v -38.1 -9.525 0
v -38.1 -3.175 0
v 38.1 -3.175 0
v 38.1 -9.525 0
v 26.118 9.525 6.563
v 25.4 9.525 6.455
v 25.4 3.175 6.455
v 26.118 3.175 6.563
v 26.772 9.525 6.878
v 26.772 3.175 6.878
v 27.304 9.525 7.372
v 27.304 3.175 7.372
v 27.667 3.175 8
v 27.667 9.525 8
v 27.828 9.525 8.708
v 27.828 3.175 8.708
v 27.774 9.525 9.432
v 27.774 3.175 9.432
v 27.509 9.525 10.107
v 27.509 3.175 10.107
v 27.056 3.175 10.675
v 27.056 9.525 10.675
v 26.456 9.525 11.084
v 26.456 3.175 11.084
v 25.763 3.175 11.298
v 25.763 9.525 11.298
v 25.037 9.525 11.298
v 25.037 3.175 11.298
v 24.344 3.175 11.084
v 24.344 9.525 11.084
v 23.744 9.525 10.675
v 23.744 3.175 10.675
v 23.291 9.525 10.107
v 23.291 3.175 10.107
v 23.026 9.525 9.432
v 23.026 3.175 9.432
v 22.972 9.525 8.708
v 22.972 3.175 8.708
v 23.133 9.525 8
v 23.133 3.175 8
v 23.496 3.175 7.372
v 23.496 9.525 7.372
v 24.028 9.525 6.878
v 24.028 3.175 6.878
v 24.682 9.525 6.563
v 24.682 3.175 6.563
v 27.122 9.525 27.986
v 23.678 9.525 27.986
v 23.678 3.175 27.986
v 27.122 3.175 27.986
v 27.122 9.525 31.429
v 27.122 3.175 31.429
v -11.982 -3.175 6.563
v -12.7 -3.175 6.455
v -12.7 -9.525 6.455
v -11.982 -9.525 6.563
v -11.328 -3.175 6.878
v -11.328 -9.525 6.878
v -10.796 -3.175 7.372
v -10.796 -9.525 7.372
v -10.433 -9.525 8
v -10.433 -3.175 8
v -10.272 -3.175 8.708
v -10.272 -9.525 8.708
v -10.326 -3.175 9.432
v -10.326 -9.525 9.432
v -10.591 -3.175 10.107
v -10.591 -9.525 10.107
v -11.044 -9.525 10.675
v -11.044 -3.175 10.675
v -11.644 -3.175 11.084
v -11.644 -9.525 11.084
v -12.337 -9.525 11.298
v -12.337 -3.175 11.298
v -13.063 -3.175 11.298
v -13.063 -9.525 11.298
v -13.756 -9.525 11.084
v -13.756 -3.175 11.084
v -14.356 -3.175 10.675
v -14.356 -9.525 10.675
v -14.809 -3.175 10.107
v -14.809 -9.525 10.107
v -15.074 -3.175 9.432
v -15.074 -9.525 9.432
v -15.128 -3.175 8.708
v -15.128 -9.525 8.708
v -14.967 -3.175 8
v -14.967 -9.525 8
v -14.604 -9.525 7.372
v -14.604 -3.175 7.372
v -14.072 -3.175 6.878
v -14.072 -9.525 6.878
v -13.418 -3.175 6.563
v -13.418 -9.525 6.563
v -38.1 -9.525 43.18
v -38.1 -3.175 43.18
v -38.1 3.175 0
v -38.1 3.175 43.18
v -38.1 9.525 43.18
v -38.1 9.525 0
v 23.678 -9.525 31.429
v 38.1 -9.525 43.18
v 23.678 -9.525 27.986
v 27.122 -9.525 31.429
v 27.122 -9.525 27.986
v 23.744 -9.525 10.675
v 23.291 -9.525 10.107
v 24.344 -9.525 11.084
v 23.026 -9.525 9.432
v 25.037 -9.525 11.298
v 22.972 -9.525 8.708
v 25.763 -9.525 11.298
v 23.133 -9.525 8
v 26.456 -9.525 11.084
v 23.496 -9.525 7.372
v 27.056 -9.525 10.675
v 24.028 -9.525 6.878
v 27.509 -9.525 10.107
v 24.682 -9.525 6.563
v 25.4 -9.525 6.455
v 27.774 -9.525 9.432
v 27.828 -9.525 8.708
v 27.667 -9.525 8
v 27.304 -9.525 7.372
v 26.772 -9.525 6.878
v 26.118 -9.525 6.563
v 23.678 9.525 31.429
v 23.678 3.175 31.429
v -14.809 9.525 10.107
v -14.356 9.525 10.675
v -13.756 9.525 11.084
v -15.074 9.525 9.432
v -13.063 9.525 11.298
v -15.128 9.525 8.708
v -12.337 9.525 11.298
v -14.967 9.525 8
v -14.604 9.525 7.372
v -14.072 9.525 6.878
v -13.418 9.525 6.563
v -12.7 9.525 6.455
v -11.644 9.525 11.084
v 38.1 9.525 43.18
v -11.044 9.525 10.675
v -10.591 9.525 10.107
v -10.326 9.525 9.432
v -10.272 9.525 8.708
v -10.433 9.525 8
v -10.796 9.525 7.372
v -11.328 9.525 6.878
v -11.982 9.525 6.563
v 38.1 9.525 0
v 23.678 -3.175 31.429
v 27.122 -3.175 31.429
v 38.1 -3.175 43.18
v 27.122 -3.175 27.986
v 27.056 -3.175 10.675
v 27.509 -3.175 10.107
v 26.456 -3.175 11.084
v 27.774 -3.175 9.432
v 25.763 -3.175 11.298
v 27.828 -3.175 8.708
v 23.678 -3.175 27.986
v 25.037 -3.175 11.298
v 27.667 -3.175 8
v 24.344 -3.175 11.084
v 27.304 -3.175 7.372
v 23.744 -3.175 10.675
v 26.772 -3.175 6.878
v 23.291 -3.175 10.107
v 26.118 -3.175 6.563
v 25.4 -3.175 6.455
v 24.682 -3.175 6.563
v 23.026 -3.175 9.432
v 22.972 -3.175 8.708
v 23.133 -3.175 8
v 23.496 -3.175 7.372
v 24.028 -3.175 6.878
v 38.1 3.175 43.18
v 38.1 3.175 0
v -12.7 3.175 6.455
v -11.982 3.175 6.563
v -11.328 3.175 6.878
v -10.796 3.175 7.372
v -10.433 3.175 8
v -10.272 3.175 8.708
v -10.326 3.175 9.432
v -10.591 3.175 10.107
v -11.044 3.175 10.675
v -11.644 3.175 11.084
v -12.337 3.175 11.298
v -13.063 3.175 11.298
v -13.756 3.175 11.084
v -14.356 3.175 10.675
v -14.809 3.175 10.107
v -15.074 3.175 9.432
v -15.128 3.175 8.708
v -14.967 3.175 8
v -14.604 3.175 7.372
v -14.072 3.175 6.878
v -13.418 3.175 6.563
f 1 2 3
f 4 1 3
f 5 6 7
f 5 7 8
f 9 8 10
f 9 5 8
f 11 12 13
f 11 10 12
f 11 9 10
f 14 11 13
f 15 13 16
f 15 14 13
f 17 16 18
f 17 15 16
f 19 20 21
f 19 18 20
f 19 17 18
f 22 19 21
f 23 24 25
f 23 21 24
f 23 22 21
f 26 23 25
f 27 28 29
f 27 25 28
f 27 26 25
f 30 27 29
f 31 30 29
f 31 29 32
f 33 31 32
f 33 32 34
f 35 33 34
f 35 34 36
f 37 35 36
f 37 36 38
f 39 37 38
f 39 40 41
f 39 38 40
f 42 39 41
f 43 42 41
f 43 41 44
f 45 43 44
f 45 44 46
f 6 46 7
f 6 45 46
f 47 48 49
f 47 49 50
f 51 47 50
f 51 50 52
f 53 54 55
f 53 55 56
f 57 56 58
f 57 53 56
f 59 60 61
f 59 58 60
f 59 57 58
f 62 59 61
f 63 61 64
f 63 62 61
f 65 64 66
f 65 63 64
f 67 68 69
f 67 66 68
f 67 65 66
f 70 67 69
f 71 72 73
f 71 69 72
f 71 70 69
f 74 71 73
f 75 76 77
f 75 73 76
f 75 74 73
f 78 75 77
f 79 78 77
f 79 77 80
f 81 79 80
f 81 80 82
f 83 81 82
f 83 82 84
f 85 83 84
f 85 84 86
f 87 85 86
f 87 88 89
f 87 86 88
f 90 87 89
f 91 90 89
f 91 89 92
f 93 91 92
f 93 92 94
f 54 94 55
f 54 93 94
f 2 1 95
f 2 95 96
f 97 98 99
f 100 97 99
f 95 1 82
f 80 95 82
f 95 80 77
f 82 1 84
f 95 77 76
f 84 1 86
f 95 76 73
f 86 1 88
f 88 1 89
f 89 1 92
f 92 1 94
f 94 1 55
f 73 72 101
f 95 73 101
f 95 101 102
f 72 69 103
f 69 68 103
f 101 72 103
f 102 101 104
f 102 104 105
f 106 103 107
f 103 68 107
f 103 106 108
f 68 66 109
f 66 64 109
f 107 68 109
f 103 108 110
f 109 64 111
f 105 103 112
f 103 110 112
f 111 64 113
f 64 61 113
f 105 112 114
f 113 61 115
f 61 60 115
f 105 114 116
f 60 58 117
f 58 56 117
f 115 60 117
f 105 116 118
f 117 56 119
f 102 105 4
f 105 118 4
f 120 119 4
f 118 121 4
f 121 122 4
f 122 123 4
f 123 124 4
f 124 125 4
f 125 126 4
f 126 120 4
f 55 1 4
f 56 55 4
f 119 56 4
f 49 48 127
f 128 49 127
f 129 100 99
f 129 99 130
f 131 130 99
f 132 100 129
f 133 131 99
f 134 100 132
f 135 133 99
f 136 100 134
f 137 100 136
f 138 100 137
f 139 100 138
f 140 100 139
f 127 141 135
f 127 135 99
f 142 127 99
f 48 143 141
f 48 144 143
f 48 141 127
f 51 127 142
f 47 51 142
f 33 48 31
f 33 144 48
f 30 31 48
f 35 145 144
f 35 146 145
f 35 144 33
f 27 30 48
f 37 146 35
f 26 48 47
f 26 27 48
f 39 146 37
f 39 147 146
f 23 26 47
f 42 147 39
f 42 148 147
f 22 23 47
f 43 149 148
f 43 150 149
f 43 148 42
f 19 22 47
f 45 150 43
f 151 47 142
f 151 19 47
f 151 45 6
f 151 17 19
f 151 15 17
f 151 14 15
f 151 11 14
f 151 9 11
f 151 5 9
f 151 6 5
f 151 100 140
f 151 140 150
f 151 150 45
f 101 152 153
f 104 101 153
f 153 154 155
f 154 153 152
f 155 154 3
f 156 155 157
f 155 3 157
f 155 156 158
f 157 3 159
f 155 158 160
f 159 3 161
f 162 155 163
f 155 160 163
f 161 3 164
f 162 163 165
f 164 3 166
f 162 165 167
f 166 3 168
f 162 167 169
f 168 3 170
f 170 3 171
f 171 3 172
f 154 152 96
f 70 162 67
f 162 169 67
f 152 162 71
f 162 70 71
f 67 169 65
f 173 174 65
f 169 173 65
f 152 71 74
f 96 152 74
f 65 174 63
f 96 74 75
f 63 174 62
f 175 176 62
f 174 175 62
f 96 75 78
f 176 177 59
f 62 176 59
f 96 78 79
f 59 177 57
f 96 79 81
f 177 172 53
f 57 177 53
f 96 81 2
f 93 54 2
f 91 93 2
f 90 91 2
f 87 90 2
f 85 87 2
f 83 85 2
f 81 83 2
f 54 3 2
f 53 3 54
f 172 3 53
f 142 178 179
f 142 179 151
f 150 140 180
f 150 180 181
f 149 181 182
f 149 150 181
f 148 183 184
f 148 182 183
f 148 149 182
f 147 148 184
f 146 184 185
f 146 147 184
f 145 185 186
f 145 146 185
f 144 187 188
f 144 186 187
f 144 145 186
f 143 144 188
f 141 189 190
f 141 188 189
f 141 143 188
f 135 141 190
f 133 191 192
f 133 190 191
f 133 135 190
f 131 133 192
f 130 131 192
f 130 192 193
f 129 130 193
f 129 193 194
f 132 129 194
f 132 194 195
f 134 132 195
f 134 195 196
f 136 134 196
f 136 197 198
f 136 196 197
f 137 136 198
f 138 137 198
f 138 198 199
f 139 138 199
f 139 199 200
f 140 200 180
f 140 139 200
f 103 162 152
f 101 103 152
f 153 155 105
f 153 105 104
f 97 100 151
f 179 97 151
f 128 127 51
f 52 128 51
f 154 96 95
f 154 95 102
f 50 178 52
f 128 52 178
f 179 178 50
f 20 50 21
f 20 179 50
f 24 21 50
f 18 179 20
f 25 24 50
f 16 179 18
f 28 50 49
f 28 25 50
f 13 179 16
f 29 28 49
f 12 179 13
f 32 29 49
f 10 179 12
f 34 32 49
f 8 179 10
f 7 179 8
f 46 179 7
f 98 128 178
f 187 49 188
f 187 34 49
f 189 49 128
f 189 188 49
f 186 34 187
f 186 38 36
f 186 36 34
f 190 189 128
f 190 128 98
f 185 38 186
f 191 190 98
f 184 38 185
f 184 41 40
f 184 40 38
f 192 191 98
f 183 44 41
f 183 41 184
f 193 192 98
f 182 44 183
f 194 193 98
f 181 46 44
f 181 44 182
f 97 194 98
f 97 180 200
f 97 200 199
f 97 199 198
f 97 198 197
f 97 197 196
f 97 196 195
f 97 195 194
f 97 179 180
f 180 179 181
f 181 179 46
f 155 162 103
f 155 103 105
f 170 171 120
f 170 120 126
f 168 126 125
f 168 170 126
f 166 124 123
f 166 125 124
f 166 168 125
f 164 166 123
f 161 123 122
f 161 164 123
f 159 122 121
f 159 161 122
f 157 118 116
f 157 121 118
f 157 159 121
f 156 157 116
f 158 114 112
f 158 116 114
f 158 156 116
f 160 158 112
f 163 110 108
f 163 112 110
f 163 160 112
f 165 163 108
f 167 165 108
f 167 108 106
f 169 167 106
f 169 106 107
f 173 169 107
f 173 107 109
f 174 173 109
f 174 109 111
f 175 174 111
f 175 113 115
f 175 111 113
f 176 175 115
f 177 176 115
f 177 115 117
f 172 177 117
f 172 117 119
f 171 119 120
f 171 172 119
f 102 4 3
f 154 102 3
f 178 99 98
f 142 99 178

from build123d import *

# Parameters (mm, degrees)
SKETCH1_W               = 76.2
SKETCH1_H               = 19.05
BOSS_EXTRUDE1_DEPTH     = 43.18
SKETCH2_W               = 76.2
SKETCH2_H               = 6.35
CUT_EXTRUDE1_DEPTH      = 59.36821074
CUT_EXTRUDE2_DEPTH      = 61.654965996
CUT_EXTRUDE2_DEPTH_BACK = 61.654965996
SKETCH3_R               = 2.434895054
SKETCH3_W               = 3.44346125
SKETCH3_H               = 3.443461249


with BuildPart() as part:
    # Sketch1 → Boss-Extrude1 (new body)
    with BuildSketch(Plane.XY):
        Rectangle(SKETCH1_W, SKETCH1_H)
    extrude(amount=BOSS_EXTRUDE1_DEPTH)

    # Sketch2 → Cut-Extrude1 (cut, through all)
    with BuildSketch(Plane(origin=(0, 0, 0), x_dir=(-1, 0, 0), z_dir=(0, 0, -1))):
        Rectangle(SKETCH2_W, SKETCH2_H)
    extrude(amount=-CUT_EXTRUDE1_DEPTH, mode=Mode.SUBTRACT)


with BuildPart() as cut_extrude1_piece_1:
    # of the separate pieces the step leaves, piece 1, a body of its own (cut_extrude1_pieces)
    add(part.part.solids().sort_by_distance((-38.1, 9.525, 0))[0])


with BuildPart() as cut_extrude1_piece_2:
    # of the separate pieces the step leaves, piece 2, a body of its own (cut_extrude1_pieces)
    add(part.part.solids().sort_by_distance((-38.1, -9.525, 0))[0])


with BuildPart() as cut_extrude2_tool:
    # Sketch3 → Cut-Extrude2 (new, two sides: drawn at the far end of the back side and taken through both)
    with BuildSketch(Plane.XZ.offset(9.525).offset(-CUT_EXTRUDE2_DEPTH_BACK)):
        with Locations(Location((25.4, 8.89, 0), (0, 0, 270))):
            Circle(SKETCH3_R)
        with Locations(Location((-12.7, 8.89, 0), (0, 0, 270))):
            Circle(SKETCH3_R)
        with Locations((25.4, 29.707720771)):
            Rectangle(SKETCH3_W, SKETCH3_H)
    extrude(amount=CUT_EXTRUDE2_DEPTH + CUT_EXTRUDE2_DEPTH_BACK)


with BuildPart() as cut_extrude1_piece_1_1:
    add(cut_extrude1_piece_1.part)

    # Cut-Extrude2: cut by cut_extrude2_tool
    add(cut_extrude2_tool.part, mode=Mode.SUBTRACT)


with BuildPart() as cut_extrude1_piece_2_1:
    add(cut_extrude1_piece_2.part)

    # Cut-Extrude2: cut by cut_extrude2_tool
    add(cut_extrude2_tool.part, mode=Mode.SUBTRACT)


solid = Compound([cut_extrude1_piece_1_1.part, cut_extrude1_piece_2_1.part])
